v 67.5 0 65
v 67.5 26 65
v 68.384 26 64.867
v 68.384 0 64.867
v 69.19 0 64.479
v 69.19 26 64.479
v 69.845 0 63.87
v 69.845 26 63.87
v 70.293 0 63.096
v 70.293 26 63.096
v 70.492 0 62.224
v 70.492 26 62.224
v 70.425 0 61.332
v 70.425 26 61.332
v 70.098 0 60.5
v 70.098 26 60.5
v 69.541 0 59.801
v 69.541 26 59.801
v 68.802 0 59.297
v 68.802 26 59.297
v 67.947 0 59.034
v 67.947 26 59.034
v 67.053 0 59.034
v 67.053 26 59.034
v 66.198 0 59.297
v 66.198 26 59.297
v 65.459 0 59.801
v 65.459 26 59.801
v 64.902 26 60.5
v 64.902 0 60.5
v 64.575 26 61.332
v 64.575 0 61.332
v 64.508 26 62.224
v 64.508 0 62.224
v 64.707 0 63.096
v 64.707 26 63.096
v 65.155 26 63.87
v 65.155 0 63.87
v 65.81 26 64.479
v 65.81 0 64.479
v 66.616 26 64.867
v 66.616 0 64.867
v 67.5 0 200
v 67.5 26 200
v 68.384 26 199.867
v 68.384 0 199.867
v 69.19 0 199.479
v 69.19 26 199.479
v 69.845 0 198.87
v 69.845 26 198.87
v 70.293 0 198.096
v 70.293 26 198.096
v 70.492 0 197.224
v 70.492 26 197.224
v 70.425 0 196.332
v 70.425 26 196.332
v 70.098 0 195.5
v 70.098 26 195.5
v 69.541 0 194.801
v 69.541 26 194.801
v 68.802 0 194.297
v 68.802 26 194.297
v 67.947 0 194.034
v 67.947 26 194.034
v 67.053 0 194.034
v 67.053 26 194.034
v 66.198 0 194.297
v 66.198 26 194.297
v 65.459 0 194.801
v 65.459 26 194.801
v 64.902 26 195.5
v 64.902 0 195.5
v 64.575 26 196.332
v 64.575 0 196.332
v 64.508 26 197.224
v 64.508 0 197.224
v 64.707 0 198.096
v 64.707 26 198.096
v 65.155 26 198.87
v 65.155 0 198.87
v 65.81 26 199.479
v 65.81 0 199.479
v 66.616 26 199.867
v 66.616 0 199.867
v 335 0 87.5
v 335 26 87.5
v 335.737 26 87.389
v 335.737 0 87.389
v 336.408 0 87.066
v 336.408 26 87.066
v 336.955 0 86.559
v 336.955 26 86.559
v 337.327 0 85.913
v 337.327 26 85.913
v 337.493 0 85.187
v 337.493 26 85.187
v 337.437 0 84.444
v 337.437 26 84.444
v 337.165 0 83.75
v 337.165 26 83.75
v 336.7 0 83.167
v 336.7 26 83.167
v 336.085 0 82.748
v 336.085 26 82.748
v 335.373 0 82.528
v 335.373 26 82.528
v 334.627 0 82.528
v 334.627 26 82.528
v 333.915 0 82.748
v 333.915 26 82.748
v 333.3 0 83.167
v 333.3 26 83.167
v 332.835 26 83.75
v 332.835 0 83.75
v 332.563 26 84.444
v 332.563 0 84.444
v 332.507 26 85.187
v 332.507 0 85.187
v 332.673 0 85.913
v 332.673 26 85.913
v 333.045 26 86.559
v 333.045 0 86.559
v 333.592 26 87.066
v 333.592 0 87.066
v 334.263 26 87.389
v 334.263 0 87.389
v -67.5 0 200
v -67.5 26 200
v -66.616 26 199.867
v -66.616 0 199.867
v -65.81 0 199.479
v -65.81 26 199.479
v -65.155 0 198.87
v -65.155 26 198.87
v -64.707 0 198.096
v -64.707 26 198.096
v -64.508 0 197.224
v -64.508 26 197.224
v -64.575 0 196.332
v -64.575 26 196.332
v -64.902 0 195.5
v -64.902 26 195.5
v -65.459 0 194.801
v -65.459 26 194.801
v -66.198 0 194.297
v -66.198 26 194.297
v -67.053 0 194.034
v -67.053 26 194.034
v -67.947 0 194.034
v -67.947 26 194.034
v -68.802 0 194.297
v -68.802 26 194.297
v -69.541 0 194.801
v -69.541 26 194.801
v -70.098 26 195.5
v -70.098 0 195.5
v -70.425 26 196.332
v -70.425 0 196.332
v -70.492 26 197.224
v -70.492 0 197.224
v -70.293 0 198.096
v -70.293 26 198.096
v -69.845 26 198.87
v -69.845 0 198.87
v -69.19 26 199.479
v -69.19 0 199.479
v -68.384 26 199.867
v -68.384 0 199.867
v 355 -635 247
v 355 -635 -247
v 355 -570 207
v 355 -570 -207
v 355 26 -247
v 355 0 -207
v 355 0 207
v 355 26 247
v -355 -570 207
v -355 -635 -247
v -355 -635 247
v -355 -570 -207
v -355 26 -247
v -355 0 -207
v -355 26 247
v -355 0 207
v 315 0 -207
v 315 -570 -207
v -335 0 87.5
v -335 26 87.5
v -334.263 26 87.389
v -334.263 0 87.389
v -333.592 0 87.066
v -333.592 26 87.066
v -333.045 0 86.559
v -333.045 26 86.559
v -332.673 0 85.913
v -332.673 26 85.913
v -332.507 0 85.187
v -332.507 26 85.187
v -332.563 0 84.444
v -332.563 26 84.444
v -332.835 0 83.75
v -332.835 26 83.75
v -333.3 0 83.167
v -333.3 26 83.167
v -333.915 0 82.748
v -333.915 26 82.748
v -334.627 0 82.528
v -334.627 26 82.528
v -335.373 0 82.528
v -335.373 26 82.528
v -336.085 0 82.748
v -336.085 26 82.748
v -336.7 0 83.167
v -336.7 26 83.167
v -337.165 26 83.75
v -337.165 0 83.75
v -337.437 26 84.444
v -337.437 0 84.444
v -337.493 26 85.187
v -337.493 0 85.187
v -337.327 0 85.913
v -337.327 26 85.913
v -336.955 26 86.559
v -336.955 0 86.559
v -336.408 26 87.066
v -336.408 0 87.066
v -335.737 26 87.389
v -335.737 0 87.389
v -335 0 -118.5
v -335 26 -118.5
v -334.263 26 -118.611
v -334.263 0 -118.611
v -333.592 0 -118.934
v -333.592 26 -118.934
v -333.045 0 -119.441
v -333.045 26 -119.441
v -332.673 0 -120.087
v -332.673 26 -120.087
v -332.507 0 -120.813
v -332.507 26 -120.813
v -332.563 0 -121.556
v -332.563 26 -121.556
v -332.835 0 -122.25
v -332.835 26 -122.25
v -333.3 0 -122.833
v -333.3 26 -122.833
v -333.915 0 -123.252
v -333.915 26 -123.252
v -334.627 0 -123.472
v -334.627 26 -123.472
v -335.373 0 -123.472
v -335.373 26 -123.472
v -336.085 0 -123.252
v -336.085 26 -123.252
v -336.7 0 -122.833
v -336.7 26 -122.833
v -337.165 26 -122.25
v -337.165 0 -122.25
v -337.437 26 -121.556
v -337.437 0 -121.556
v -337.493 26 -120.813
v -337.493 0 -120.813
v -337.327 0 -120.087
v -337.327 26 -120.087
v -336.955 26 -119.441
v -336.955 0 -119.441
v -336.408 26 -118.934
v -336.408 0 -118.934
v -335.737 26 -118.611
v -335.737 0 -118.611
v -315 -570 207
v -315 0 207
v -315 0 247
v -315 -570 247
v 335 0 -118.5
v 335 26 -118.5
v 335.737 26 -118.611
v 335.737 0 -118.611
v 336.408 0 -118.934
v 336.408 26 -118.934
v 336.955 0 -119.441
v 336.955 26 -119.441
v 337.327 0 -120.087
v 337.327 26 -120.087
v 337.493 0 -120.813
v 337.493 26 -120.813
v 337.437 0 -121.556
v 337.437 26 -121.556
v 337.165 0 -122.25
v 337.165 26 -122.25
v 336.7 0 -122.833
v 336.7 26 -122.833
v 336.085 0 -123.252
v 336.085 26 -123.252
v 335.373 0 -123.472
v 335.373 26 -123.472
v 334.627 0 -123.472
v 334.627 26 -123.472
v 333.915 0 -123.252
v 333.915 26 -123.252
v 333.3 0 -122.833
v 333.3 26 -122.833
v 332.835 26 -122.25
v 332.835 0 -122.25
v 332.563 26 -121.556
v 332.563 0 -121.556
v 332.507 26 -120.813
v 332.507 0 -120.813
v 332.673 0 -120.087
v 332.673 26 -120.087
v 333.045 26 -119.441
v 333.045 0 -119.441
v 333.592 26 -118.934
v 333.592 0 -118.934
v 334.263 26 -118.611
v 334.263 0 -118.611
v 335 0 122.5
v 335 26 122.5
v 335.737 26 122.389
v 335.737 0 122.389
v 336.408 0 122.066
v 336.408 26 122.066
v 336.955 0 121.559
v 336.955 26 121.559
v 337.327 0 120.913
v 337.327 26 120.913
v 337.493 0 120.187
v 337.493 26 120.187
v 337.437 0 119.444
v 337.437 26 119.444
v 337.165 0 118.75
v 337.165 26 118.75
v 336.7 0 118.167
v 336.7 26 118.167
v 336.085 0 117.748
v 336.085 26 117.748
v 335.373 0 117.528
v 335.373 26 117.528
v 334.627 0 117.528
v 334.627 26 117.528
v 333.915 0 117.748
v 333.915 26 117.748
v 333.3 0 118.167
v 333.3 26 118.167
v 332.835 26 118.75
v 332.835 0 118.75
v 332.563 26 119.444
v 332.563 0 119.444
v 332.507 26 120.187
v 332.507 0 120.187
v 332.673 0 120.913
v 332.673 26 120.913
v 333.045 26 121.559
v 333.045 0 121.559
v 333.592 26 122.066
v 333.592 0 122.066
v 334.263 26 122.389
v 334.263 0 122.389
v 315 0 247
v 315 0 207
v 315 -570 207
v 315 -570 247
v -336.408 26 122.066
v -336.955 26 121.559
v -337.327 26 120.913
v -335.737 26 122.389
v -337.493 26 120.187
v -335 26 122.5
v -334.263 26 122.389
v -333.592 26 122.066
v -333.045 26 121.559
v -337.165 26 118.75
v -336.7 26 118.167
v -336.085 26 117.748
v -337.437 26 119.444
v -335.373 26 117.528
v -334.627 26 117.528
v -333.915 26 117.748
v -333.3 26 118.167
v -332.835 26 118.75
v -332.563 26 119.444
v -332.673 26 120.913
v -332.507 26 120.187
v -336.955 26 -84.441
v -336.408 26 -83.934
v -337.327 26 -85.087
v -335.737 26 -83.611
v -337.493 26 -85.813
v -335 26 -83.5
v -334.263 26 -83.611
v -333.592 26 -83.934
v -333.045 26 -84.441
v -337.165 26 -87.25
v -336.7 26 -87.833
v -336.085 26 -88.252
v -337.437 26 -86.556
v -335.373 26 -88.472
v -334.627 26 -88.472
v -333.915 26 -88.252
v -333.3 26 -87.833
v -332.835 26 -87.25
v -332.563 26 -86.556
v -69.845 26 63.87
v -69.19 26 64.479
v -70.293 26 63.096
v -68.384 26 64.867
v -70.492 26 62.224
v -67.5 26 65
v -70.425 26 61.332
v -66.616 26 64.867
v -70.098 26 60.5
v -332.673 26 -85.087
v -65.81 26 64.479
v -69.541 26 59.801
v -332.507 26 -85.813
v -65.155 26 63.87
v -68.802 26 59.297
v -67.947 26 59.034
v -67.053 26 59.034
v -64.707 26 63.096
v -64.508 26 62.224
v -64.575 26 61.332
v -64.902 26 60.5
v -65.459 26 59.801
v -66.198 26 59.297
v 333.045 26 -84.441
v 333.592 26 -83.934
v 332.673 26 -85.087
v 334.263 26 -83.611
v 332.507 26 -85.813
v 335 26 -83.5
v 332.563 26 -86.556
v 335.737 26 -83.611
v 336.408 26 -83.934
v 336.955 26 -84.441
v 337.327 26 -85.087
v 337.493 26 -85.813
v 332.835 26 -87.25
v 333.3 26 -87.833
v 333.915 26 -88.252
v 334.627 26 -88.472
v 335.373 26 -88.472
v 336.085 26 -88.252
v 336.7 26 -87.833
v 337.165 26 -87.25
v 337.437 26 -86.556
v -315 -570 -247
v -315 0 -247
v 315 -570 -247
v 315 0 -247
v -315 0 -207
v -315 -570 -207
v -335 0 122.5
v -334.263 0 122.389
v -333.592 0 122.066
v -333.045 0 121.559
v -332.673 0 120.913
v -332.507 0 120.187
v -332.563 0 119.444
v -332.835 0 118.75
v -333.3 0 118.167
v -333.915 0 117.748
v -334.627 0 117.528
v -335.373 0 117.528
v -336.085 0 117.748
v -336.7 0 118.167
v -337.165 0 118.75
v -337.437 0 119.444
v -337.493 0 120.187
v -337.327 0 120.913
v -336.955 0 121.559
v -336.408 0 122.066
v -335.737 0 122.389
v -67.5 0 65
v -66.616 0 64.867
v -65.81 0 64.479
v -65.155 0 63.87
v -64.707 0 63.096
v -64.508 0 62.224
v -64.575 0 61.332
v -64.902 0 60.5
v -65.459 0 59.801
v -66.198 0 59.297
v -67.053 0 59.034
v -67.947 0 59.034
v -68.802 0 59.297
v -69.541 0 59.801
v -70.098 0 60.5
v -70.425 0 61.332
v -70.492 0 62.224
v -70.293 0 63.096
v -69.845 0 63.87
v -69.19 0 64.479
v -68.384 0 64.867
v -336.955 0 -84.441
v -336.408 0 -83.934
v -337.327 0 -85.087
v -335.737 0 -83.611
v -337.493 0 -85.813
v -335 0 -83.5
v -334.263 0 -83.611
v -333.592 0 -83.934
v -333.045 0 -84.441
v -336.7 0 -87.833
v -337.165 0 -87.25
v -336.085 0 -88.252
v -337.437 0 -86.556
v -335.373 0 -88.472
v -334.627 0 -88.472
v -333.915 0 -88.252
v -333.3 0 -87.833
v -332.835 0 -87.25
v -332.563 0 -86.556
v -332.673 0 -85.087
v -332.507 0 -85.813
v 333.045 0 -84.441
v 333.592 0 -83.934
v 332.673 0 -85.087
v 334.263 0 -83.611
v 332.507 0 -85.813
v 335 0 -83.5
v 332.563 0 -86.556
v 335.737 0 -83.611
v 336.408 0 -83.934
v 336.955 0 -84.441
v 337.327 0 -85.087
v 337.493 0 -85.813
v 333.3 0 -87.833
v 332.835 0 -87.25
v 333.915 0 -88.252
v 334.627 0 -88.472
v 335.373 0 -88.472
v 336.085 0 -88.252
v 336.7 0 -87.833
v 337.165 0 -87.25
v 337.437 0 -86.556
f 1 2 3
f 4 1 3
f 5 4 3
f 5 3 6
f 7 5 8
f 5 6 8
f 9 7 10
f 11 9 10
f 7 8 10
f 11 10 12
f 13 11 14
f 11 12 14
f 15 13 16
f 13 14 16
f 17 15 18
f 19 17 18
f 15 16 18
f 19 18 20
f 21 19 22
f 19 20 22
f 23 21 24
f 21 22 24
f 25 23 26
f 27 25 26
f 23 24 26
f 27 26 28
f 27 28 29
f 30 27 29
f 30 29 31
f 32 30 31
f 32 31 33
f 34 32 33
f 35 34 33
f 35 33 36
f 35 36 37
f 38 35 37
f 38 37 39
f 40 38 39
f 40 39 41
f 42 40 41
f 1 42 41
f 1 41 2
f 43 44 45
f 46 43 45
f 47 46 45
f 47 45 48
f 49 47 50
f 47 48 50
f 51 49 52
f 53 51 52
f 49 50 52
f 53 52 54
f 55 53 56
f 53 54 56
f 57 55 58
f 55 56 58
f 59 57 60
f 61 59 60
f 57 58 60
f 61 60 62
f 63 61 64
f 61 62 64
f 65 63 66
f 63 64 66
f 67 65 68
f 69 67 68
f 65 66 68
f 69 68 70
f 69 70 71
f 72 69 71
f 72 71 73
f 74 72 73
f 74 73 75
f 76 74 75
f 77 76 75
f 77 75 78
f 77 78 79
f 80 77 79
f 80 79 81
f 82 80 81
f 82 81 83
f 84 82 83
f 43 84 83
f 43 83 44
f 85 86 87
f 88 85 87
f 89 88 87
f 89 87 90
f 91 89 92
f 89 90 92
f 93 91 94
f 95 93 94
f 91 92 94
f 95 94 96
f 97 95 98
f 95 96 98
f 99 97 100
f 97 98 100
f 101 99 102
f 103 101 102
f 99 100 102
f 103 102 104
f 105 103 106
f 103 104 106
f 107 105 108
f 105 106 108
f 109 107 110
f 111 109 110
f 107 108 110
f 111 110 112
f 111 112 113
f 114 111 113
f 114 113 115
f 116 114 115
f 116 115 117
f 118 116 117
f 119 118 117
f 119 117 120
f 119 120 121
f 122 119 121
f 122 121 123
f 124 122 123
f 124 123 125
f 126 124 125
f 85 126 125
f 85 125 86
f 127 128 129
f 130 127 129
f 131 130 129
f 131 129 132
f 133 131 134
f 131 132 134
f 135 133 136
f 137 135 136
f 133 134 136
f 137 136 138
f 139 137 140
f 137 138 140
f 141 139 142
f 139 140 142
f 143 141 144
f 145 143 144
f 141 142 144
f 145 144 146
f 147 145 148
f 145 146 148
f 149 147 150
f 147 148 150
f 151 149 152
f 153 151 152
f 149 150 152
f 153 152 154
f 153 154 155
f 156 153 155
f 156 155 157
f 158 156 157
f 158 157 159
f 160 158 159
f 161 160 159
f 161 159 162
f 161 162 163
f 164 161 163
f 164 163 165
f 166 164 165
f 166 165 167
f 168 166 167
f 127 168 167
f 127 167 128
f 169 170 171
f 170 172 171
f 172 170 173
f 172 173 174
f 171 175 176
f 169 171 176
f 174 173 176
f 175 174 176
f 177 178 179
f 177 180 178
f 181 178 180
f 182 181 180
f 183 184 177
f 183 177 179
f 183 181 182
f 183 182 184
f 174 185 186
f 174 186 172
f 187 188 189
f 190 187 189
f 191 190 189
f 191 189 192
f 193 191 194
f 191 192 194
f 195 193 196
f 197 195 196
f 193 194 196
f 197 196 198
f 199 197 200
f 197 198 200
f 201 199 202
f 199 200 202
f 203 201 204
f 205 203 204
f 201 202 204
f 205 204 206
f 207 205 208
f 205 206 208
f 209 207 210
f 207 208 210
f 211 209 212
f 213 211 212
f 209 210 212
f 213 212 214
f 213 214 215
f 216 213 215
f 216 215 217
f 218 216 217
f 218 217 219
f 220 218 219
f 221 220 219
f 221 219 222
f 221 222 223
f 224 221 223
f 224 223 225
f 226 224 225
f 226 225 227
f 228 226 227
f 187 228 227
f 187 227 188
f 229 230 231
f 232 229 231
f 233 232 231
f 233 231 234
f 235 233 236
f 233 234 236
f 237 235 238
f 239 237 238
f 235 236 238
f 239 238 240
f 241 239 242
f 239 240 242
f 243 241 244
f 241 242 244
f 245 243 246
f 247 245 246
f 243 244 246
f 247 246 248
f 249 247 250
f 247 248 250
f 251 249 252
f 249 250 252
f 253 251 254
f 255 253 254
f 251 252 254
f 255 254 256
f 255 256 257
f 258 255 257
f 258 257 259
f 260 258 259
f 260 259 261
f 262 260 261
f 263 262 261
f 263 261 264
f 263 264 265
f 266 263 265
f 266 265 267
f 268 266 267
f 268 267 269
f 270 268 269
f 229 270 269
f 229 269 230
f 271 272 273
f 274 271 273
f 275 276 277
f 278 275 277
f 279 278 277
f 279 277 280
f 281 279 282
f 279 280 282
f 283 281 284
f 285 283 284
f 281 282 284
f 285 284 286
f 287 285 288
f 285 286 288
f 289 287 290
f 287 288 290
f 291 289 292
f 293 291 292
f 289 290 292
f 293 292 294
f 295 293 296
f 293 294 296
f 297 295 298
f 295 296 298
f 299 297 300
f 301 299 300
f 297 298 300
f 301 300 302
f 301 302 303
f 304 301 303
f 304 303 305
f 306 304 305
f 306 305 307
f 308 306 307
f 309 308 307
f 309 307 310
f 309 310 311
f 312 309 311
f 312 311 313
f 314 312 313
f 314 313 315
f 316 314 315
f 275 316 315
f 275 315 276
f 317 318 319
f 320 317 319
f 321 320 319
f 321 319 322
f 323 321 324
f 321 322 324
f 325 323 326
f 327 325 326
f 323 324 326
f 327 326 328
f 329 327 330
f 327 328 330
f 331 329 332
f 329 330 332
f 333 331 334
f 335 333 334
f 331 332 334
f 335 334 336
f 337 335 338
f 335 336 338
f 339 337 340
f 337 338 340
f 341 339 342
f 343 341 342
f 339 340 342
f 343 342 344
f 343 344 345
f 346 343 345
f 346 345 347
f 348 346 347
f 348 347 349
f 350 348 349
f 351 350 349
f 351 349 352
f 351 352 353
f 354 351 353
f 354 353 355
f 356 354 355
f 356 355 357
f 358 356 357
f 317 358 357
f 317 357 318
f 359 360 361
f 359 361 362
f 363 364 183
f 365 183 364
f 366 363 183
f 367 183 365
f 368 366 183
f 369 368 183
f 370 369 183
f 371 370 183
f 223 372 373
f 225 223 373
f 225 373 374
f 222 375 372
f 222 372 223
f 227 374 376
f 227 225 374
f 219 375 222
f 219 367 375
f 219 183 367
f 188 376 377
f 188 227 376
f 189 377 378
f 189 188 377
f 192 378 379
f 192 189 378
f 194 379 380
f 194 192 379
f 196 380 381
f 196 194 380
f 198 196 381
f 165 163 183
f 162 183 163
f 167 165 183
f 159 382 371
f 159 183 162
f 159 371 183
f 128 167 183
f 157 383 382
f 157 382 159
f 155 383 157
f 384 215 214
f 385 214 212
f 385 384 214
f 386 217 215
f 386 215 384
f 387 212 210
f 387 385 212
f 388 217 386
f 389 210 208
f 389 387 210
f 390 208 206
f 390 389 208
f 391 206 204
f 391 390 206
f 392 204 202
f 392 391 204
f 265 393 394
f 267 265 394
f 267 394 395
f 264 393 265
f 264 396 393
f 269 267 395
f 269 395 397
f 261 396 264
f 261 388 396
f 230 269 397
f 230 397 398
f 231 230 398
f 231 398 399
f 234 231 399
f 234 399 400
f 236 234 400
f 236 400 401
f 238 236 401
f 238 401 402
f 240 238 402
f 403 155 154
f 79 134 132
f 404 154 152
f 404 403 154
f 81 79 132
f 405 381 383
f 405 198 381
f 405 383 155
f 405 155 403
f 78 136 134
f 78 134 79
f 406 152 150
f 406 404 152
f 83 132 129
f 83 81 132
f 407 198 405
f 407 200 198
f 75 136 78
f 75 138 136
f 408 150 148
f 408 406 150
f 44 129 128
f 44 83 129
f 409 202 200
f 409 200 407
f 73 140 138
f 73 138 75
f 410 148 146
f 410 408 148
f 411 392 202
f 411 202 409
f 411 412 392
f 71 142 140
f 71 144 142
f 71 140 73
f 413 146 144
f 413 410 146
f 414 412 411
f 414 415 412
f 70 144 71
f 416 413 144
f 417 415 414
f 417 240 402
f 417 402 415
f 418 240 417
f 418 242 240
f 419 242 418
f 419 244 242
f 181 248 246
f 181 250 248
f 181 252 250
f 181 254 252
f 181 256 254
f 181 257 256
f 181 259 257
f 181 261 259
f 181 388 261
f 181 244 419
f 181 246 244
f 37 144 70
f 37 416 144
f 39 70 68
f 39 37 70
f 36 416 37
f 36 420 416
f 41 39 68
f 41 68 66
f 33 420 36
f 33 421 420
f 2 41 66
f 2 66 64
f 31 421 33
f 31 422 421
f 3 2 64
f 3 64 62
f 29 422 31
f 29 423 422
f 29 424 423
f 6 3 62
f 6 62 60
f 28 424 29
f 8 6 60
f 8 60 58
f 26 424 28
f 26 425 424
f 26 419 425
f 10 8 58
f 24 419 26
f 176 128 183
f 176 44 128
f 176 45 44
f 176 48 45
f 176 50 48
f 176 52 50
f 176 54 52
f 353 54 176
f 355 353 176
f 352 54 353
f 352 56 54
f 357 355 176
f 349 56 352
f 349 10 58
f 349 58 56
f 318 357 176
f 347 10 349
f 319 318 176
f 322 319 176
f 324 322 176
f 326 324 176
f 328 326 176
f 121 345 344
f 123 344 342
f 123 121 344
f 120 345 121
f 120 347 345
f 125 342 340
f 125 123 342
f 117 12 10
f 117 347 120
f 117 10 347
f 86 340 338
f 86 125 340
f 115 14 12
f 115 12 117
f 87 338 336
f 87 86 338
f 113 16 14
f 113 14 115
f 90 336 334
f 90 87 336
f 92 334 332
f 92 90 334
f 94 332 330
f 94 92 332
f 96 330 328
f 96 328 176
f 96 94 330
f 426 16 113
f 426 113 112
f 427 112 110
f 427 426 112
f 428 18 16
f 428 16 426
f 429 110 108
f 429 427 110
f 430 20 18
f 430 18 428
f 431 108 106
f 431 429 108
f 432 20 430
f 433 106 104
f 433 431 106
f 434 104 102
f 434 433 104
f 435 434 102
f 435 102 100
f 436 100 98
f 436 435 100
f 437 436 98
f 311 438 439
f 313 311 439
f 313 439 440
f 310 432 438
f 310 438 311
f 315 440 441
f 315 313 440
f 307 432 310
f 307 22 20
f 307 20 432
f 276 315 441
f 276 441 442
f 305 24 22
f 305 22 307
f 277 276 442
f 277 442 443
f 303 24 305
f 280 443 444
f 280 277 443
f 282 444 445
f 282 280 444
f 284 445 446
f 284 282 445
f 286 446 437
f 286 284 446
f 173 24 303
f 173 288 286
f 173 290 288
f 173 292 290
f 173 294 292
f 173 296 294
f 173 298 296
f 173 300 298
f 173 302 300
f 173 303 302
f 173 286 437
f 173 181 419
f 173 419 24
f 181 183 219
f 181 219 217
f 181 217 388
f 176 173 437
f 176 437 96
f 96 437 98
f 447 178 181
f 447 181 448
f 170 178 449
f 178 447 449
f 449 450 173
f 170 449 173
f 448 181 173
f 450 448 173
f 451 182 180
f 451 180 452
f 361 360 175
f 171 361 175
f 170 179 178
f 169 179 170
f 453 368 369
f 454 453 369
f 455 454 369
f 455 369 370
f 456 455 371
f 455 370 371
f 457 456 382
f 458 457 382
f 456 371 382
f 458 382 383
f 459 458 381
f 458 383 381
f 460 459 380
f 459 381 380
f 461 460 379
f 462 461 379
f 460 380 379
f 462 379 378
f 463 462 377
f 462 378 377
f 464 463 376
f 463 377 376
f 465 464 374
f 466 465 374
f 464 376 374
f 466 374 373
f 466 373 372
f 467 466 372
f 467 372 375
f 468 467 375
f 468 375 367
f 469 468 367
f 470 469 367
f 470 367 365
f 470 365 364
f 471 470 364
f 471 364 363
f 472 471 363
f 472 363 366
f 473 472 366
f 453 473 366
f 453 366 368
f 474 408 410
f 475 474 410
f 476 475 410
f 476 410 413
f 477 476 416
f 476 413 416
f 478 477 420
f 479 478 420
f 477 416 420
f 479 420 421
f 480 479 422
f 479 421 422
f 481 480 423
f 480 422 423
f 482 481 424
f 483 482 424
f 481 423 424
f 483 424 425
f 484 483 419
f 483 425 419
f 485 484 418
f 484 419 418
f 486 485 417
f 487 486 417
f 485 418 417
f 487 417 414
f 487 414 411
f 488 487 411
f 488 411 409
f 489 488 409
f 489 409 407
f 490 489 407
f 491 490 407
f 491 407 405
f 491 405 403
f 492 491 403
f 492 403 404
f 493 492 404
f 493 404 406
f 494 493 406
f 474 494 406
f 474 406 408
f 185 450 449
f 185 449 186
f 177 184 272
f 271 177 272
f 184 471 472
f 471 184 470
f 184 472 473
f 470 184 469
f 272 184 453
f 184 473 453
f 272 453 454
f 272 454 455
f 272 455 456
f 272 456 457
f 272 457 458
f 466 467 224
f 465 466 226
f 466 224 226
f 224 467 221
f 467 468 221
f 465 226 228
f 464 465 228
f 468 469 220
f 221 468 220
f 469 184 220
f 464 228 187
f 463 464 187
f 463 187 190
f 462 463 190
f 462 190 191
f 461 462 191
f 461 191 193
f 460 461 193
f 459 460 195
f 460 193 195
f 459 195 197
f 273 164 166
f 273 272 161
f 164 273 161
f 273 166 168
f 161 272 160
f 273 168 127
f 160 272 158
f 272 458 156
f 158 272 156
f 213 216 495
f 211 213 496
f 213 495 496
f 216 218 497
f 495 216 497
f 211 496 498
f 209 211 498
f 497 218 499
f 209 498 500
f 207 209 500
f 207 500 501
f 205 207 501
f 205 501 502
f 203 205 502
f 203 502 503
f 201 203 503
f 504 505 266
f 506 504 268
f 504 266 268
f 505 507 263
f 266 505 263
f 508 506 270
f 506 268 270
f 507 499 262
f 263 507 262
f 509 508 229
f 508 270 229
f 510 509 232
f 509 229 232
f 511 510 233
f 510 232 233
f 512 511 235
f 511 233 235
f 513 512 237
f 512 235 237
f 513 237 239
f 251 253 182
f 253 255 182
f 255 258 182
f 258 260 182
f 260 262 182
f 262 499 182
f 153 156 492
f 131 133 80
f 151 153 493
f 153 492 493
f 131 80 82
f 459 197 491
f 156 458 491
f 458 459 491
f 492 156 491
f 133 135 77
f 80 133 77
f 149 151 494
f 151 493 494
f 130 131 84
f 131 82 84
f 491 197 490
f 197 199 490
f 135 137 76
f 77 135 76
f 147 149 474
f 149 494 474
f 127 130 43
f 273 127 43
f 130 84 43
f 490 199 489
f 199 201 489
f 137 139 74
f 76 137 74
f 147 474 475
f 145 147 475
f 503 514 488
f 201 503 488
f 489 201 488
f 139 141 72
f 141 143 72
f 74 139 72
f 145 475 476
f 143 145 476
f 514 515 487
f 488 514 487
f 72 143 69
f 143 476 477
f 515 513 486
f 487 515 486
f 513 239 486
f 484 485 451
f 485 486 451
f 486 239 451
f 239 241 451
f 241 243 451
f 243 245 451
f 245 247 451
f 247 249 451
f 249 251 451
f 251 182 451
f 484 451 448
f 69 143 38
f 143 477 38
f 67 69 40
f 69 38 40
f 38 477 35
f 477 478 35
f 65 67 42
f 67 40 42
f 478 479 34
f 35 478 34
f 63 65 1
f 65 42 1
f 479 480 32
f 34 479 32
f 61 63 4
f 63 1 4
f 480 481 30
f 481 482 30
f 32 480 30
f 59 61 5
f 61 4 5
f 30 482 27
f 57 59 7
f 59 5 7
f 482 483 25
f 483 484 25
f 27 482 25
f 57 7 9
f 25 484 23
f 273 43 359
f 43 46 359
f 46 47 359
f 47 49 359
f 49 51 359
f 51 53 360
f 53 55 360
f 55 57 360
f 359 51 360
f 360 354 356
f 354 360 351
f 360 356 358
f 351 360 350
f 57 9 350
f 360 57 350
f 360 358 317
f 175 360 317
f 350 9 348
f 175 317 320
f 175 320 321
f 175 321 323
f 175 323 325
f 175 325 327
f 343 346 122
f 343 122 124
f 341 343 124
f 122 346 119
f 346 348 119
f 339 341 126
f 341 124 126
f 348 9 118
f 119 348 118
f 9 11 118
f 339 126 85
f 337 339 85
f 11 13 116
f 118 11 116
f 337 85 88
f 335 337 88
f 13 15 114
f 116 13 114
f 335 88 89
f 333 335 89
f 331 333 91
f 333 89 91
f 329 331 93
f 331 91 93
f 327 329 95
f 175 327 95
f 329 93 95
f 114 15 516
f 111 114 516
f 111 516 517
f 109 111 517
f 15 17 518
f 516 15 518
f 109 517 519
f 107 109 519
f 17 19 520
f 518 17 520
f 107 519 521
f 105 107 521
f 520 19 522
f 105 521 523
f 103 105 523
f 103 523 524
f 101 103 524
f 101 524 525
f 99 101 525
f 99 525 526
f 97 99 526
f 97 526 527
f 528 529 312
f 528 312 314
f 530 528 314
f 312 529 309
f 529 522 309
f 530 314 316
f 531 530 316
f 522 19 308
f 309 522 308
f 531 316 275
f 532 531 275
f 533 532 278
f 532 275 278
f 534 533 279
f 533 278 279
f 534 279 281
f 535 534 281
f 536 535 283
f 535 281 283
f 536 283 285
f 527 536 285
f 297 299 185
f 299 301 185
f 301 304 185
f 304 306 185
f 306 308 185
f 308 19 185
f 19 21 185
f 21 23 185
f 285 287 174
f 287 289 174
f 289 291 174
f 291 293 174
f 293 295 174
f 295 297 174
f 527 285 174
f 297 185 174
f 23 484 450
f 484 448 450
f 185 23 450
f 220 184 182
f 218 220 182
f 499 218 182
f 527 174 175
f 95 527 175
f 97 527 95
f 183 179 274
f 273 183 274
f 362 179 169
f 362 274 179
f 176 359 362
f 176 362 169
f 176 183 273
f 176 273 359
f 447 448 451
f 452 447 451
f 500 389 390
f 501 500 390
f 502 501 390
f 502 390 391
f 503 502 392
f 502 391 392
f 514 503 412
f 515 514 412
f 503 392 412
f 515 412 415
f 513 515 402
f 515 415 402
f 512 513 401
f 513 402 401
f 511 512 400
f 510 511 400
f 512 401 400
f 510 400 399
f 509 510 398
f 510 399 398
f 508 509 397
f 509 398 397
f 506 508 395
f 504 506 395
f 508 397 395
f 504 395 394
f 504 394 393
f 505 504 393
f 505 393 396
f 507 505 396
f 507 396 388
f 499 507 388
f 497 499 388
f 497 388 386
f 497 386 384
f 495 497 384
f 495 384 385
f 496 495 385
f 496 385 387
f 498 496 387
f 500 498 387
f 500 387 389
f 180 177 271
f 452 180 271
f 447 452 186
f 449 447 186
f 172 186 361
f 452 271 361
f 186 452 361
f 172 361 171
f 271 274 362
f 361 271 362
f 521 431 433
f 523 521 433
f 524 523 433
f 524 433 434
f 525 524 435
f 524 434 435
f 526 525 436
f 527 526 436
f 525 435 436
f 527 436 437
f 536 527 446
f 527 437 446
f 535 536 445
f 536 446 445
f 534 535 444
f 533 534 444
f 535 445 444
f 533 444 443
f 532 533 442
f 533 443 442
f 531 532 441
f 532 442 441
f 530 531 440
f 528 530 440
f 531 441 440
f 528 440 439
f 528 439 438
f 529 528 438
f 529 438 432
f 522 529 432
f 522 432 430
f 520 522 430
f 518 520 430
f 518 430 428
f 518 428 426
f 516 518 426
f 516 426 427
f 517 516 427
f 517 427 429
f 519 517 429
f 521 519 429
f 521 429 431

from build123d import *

# Parameters (mm, degrees)
SKETCH1_W           = 710
SKETCH1_H           = 494
BOSS_EXTRUDE1_DEPTH = 26
SKETCH2_R           = 3
CUT_EXTRUDE1_DEPTH  = 434.255121147
CUT_EXTRUDE2_REACH  = 435.255
SKETCH3_R           = 2.5
SKETCH4_W           = 40
SKETCH4_H           = 40
BOSS_EXTRUDE2_DEPTH = 570
SKETCH5_W           = 710
SKETCH5_H           = 494
BOSS_EXTRUDE3_DEPTH = 65


with BuildPart() as part:
    # Sketch1 → Boss-Extrude1 (new body)
    with BuildSketch(Plane(origin=(0, 0, 0), x_dir=(1, 0, 0), z_dir=(0, 1, 0))):
        Rectangle(SKETCH1_W, SKETCH1_H)
    extrude(amount=BOSS_EXTRUDE1_DEPTH)

    # Sketch2 → Cut-Extrude1 (cut, through all)
    with BuildSketch(Plane(origin=(0, 26, 0), x_dir=(1, 0, 0), z_dir=(0, 1, 0))):
        with Locations(Location((-67.5, -62, 0), (0, 0, 270))):
            Circle(SKETCH2_R)
        with Locations(Location((-67.5, -197, 0), (0, 0, 270))):
            Circle(SKETCH2_R)
        with Locations(Location((67.5, -197, 0), (0, 0, 270))):
            Circle(SKETCH2_R)
        with Locations(Location((67.5, -62, 0), (0, 0, 270))):
            Circle(SKETCH2_R)
    extrude(amount=-CUT_EXTRUDE1_DEPTH, mode=Mode.SUBTRACT)

    # Sketch3 → Cut-Extrude2 (cut, up to next)
    with BuildSketch(Plane(origin=(0, 26, 0), x_dir=(1, 0, 0), z_dir=(0, 1, 0)), mode=Mode.PRIVATE) as cut_extrude2_sk1:
        with Locations(Location((-335, 121, 0), (0, 0, 270))):
            Circle(SKETCH3_R)
    cut_extrude2_tool1 = extrude(cut_extrude2_sk1.sketch, amount=-CUT_EXTRUDE2_REACH, mode=Mode.PRIVATE) & part.part
    # Sketch3 → Cut-Extrude2 (cut, up to next)
    with BuildSketch(Plane(origin=(0, 26, 0), x_dir=(1, 0, 0), z_dir=(0, 1, 0)), mode=Mode.PRIVATE) as cut_extrude2_sk2:
        with Locations(Location((-335, 86, 0), (0, 0, 270))):
            Circle(SKETCH3_R)
    cut_extrude2_tool2 = extrude(cut_extrude2_sk2.sketch, amount=-CUT_EXTRUDE2_REACH, mode=Mode.PRIVATE) & part.part
    # Sketch3 → Cut-Extrude2 (cut, up to next)
    with BuildSketch(Plane(origin=(0, 26, 0), x_dir=(1, 0, 0), z_dir=(0, 1, 0)), mode=Mode.PRIVATE) as cut_extrude2_sk3:
        with Locations(Location((335, 86, 0), (0, 0, 270))):
            Circle(SKETCH3_R)
    cut_extrude2_tool3 = extrude(cut_extrude2_sk3.sketch, amount=-CUT_EXTRUDE2_REACH, mode=Mode.PRIVATE) & part.part
    # Sketch3 → Cut-Extrude2 (cut, up to next)
    with BuildSketch(Plane(origin=(0, 26, 0), x_dir=(1, 0, 0), z_dir=(0, 1, 0)), mode=Mode.PRIVATE) as cut_extrude2_sk4:
        with Locations(Location((335, 121, 0), (0, 0, 270))):
            Circle(SKETCH3_R)
    cut_extrude2_tool4 = extrude(cut_extrude2_sk4.sketch, amount=-CUT_EXTRUDE2_REACH, mode=Mode.PRIVATE) & part.part
    # Sketch3 → Cut-Extrude2 (cut, up to next)
    with BuildSketch(Plane(origin=(0, 26, 0), x_dir=(1, 0, 0), z_dir=(0, 1, 0)), mode=Mode.PRIVATE) as cut_extrude2_sk5:
        with Locations(Location((335, -85, 0), (0, 0, 270))):
            Circle(SKETCH3_R)
    cut_extrude2_tool5 = extrude(cut_extrude2_sk5.sketch, amount=-CUT_EXTRUDE2_REACH, mode=Mode.PRIVATE) & part.part
    # Sketch3 → Cut-Extrude2 (cut, up to next)
    with BuildSketch(Plane(origin=(0, 26, 0), x_dir=(1, 0, 0), z_dir=(0, 1, 0)), mode=Mode.PRIVATE) as cut_extrude2_sk6:
        with Locations(Location((335, -120, 0), (0, 0, 270))):
            Circle(SKETCH3_R)
    cut_extrude2_tool6 = extrude(cut_extrude2_sk6.sketch, amount=-CUT_EXTRUDE2_REACH, mode=Mode.PRIVATE) & part.part
    # Sketch3 → Cut-Extrude2 (cut, up to next)
    with BuildSketch(Plane(origin=(0, 26, 0), x_dir=(1, 0, 0), z_dir=(0, 1, 0)), mode=Mode.PRIVATE) as cut_extrude2_sk7:
        with Locations(Location((-335, -85, 0), (0, 0, 270))):
            Circle(SKETCH3_R)
    cut_extrude2_tool7 = extrude(cut_extrude2_sk7.sketch, amount=-CUT_EXTRUDE2_REACH, mode=Mode.PRIVATE) & part.part
    # Sketch3 → Cut-Extrude2 (cut, up to next)
    with BuildSketch(Plane(origin=(0, 26, 0), x_dir=(1, 0, 0), z_dir=(0, 1, 0)), mode=Mode.PRIVATE) as cut_extrude2_sk8:
        with Locations(Location((-335, -120, 0), (0, 0, 270))):
            Circle(SKETCH3_R)
    cut_extrude2_tool8 = extrude(cut_extrude2_sk8.sketch, amount=-CUT_EXTRUDE2_REACH, mode=Mode.PRIVATE) & part.part
    add(cut_extrude2_tool1.solids().sort_by_distance((-335, 26, -121))[0], mode=Mode.SUBTRACT)
    add(cut_extrude2_tool2.solids().sort_by_distance((-335, 26, -86))[0], mode=Mode.SUBTRACT)
    add(cut_extrude2_tool3.solids().sort_by_distance((335, 26, -86))[0], mode=Mode.SUBTRACT)
    add(cut_extrude2_tool4.solids().sort_by_distance((335, 26, -121))[0], mode=Mode.SUBTRACT)
    add(cut_extrude2_tool5.solids().sort_by_distance((335, 26, 85))[0], mode=Mode.SUBTRACT)
    add(cut_extrude2_tool6.solids().sort_by_distance((335, 26, 120))[0], mode=Mode.SUBTRACT)
    add(cut_extrude2_tool7.solids().sort_by_distance((-335, 26, 85))[0], mode=Mode.SUBTRACT)
    add(cut_extrude2_tool8.solids().sort_by_distance((-335, 26, 120))[0], mode=Mode.SUBTRACT)

    # Sketch4 → Boss-Extrude2 (add)
    with BuildSketch(Plane.XZ):
        with Locations((-335, 227)):
            Rectangle(SKETCH4_W, SKETCH4_H)
        with Locations((-335, -227)):
            Rectangle(SKETCH4_W, SKETCH4_H)
        with Locations((335, 227)):
            Rectangle(SKETCH4_W, SKETCH4_H)
        with Locations((335, -227)):
            Rectangle(SKETCH4_W, SKETCH4_H)
    extrude(amount=BOSS_EXTRUDE2_DEPTH)

    # Sketch5 → Boss-Extrude3 (add)
    with BuildSketch(Plane.XZ.offset(570)):
        Rectangle(SKETCH5_W, SKETCH5_H)
    extrude(amount=BOSS_EXTRUDE3_DEPTH)


solid = part.part
